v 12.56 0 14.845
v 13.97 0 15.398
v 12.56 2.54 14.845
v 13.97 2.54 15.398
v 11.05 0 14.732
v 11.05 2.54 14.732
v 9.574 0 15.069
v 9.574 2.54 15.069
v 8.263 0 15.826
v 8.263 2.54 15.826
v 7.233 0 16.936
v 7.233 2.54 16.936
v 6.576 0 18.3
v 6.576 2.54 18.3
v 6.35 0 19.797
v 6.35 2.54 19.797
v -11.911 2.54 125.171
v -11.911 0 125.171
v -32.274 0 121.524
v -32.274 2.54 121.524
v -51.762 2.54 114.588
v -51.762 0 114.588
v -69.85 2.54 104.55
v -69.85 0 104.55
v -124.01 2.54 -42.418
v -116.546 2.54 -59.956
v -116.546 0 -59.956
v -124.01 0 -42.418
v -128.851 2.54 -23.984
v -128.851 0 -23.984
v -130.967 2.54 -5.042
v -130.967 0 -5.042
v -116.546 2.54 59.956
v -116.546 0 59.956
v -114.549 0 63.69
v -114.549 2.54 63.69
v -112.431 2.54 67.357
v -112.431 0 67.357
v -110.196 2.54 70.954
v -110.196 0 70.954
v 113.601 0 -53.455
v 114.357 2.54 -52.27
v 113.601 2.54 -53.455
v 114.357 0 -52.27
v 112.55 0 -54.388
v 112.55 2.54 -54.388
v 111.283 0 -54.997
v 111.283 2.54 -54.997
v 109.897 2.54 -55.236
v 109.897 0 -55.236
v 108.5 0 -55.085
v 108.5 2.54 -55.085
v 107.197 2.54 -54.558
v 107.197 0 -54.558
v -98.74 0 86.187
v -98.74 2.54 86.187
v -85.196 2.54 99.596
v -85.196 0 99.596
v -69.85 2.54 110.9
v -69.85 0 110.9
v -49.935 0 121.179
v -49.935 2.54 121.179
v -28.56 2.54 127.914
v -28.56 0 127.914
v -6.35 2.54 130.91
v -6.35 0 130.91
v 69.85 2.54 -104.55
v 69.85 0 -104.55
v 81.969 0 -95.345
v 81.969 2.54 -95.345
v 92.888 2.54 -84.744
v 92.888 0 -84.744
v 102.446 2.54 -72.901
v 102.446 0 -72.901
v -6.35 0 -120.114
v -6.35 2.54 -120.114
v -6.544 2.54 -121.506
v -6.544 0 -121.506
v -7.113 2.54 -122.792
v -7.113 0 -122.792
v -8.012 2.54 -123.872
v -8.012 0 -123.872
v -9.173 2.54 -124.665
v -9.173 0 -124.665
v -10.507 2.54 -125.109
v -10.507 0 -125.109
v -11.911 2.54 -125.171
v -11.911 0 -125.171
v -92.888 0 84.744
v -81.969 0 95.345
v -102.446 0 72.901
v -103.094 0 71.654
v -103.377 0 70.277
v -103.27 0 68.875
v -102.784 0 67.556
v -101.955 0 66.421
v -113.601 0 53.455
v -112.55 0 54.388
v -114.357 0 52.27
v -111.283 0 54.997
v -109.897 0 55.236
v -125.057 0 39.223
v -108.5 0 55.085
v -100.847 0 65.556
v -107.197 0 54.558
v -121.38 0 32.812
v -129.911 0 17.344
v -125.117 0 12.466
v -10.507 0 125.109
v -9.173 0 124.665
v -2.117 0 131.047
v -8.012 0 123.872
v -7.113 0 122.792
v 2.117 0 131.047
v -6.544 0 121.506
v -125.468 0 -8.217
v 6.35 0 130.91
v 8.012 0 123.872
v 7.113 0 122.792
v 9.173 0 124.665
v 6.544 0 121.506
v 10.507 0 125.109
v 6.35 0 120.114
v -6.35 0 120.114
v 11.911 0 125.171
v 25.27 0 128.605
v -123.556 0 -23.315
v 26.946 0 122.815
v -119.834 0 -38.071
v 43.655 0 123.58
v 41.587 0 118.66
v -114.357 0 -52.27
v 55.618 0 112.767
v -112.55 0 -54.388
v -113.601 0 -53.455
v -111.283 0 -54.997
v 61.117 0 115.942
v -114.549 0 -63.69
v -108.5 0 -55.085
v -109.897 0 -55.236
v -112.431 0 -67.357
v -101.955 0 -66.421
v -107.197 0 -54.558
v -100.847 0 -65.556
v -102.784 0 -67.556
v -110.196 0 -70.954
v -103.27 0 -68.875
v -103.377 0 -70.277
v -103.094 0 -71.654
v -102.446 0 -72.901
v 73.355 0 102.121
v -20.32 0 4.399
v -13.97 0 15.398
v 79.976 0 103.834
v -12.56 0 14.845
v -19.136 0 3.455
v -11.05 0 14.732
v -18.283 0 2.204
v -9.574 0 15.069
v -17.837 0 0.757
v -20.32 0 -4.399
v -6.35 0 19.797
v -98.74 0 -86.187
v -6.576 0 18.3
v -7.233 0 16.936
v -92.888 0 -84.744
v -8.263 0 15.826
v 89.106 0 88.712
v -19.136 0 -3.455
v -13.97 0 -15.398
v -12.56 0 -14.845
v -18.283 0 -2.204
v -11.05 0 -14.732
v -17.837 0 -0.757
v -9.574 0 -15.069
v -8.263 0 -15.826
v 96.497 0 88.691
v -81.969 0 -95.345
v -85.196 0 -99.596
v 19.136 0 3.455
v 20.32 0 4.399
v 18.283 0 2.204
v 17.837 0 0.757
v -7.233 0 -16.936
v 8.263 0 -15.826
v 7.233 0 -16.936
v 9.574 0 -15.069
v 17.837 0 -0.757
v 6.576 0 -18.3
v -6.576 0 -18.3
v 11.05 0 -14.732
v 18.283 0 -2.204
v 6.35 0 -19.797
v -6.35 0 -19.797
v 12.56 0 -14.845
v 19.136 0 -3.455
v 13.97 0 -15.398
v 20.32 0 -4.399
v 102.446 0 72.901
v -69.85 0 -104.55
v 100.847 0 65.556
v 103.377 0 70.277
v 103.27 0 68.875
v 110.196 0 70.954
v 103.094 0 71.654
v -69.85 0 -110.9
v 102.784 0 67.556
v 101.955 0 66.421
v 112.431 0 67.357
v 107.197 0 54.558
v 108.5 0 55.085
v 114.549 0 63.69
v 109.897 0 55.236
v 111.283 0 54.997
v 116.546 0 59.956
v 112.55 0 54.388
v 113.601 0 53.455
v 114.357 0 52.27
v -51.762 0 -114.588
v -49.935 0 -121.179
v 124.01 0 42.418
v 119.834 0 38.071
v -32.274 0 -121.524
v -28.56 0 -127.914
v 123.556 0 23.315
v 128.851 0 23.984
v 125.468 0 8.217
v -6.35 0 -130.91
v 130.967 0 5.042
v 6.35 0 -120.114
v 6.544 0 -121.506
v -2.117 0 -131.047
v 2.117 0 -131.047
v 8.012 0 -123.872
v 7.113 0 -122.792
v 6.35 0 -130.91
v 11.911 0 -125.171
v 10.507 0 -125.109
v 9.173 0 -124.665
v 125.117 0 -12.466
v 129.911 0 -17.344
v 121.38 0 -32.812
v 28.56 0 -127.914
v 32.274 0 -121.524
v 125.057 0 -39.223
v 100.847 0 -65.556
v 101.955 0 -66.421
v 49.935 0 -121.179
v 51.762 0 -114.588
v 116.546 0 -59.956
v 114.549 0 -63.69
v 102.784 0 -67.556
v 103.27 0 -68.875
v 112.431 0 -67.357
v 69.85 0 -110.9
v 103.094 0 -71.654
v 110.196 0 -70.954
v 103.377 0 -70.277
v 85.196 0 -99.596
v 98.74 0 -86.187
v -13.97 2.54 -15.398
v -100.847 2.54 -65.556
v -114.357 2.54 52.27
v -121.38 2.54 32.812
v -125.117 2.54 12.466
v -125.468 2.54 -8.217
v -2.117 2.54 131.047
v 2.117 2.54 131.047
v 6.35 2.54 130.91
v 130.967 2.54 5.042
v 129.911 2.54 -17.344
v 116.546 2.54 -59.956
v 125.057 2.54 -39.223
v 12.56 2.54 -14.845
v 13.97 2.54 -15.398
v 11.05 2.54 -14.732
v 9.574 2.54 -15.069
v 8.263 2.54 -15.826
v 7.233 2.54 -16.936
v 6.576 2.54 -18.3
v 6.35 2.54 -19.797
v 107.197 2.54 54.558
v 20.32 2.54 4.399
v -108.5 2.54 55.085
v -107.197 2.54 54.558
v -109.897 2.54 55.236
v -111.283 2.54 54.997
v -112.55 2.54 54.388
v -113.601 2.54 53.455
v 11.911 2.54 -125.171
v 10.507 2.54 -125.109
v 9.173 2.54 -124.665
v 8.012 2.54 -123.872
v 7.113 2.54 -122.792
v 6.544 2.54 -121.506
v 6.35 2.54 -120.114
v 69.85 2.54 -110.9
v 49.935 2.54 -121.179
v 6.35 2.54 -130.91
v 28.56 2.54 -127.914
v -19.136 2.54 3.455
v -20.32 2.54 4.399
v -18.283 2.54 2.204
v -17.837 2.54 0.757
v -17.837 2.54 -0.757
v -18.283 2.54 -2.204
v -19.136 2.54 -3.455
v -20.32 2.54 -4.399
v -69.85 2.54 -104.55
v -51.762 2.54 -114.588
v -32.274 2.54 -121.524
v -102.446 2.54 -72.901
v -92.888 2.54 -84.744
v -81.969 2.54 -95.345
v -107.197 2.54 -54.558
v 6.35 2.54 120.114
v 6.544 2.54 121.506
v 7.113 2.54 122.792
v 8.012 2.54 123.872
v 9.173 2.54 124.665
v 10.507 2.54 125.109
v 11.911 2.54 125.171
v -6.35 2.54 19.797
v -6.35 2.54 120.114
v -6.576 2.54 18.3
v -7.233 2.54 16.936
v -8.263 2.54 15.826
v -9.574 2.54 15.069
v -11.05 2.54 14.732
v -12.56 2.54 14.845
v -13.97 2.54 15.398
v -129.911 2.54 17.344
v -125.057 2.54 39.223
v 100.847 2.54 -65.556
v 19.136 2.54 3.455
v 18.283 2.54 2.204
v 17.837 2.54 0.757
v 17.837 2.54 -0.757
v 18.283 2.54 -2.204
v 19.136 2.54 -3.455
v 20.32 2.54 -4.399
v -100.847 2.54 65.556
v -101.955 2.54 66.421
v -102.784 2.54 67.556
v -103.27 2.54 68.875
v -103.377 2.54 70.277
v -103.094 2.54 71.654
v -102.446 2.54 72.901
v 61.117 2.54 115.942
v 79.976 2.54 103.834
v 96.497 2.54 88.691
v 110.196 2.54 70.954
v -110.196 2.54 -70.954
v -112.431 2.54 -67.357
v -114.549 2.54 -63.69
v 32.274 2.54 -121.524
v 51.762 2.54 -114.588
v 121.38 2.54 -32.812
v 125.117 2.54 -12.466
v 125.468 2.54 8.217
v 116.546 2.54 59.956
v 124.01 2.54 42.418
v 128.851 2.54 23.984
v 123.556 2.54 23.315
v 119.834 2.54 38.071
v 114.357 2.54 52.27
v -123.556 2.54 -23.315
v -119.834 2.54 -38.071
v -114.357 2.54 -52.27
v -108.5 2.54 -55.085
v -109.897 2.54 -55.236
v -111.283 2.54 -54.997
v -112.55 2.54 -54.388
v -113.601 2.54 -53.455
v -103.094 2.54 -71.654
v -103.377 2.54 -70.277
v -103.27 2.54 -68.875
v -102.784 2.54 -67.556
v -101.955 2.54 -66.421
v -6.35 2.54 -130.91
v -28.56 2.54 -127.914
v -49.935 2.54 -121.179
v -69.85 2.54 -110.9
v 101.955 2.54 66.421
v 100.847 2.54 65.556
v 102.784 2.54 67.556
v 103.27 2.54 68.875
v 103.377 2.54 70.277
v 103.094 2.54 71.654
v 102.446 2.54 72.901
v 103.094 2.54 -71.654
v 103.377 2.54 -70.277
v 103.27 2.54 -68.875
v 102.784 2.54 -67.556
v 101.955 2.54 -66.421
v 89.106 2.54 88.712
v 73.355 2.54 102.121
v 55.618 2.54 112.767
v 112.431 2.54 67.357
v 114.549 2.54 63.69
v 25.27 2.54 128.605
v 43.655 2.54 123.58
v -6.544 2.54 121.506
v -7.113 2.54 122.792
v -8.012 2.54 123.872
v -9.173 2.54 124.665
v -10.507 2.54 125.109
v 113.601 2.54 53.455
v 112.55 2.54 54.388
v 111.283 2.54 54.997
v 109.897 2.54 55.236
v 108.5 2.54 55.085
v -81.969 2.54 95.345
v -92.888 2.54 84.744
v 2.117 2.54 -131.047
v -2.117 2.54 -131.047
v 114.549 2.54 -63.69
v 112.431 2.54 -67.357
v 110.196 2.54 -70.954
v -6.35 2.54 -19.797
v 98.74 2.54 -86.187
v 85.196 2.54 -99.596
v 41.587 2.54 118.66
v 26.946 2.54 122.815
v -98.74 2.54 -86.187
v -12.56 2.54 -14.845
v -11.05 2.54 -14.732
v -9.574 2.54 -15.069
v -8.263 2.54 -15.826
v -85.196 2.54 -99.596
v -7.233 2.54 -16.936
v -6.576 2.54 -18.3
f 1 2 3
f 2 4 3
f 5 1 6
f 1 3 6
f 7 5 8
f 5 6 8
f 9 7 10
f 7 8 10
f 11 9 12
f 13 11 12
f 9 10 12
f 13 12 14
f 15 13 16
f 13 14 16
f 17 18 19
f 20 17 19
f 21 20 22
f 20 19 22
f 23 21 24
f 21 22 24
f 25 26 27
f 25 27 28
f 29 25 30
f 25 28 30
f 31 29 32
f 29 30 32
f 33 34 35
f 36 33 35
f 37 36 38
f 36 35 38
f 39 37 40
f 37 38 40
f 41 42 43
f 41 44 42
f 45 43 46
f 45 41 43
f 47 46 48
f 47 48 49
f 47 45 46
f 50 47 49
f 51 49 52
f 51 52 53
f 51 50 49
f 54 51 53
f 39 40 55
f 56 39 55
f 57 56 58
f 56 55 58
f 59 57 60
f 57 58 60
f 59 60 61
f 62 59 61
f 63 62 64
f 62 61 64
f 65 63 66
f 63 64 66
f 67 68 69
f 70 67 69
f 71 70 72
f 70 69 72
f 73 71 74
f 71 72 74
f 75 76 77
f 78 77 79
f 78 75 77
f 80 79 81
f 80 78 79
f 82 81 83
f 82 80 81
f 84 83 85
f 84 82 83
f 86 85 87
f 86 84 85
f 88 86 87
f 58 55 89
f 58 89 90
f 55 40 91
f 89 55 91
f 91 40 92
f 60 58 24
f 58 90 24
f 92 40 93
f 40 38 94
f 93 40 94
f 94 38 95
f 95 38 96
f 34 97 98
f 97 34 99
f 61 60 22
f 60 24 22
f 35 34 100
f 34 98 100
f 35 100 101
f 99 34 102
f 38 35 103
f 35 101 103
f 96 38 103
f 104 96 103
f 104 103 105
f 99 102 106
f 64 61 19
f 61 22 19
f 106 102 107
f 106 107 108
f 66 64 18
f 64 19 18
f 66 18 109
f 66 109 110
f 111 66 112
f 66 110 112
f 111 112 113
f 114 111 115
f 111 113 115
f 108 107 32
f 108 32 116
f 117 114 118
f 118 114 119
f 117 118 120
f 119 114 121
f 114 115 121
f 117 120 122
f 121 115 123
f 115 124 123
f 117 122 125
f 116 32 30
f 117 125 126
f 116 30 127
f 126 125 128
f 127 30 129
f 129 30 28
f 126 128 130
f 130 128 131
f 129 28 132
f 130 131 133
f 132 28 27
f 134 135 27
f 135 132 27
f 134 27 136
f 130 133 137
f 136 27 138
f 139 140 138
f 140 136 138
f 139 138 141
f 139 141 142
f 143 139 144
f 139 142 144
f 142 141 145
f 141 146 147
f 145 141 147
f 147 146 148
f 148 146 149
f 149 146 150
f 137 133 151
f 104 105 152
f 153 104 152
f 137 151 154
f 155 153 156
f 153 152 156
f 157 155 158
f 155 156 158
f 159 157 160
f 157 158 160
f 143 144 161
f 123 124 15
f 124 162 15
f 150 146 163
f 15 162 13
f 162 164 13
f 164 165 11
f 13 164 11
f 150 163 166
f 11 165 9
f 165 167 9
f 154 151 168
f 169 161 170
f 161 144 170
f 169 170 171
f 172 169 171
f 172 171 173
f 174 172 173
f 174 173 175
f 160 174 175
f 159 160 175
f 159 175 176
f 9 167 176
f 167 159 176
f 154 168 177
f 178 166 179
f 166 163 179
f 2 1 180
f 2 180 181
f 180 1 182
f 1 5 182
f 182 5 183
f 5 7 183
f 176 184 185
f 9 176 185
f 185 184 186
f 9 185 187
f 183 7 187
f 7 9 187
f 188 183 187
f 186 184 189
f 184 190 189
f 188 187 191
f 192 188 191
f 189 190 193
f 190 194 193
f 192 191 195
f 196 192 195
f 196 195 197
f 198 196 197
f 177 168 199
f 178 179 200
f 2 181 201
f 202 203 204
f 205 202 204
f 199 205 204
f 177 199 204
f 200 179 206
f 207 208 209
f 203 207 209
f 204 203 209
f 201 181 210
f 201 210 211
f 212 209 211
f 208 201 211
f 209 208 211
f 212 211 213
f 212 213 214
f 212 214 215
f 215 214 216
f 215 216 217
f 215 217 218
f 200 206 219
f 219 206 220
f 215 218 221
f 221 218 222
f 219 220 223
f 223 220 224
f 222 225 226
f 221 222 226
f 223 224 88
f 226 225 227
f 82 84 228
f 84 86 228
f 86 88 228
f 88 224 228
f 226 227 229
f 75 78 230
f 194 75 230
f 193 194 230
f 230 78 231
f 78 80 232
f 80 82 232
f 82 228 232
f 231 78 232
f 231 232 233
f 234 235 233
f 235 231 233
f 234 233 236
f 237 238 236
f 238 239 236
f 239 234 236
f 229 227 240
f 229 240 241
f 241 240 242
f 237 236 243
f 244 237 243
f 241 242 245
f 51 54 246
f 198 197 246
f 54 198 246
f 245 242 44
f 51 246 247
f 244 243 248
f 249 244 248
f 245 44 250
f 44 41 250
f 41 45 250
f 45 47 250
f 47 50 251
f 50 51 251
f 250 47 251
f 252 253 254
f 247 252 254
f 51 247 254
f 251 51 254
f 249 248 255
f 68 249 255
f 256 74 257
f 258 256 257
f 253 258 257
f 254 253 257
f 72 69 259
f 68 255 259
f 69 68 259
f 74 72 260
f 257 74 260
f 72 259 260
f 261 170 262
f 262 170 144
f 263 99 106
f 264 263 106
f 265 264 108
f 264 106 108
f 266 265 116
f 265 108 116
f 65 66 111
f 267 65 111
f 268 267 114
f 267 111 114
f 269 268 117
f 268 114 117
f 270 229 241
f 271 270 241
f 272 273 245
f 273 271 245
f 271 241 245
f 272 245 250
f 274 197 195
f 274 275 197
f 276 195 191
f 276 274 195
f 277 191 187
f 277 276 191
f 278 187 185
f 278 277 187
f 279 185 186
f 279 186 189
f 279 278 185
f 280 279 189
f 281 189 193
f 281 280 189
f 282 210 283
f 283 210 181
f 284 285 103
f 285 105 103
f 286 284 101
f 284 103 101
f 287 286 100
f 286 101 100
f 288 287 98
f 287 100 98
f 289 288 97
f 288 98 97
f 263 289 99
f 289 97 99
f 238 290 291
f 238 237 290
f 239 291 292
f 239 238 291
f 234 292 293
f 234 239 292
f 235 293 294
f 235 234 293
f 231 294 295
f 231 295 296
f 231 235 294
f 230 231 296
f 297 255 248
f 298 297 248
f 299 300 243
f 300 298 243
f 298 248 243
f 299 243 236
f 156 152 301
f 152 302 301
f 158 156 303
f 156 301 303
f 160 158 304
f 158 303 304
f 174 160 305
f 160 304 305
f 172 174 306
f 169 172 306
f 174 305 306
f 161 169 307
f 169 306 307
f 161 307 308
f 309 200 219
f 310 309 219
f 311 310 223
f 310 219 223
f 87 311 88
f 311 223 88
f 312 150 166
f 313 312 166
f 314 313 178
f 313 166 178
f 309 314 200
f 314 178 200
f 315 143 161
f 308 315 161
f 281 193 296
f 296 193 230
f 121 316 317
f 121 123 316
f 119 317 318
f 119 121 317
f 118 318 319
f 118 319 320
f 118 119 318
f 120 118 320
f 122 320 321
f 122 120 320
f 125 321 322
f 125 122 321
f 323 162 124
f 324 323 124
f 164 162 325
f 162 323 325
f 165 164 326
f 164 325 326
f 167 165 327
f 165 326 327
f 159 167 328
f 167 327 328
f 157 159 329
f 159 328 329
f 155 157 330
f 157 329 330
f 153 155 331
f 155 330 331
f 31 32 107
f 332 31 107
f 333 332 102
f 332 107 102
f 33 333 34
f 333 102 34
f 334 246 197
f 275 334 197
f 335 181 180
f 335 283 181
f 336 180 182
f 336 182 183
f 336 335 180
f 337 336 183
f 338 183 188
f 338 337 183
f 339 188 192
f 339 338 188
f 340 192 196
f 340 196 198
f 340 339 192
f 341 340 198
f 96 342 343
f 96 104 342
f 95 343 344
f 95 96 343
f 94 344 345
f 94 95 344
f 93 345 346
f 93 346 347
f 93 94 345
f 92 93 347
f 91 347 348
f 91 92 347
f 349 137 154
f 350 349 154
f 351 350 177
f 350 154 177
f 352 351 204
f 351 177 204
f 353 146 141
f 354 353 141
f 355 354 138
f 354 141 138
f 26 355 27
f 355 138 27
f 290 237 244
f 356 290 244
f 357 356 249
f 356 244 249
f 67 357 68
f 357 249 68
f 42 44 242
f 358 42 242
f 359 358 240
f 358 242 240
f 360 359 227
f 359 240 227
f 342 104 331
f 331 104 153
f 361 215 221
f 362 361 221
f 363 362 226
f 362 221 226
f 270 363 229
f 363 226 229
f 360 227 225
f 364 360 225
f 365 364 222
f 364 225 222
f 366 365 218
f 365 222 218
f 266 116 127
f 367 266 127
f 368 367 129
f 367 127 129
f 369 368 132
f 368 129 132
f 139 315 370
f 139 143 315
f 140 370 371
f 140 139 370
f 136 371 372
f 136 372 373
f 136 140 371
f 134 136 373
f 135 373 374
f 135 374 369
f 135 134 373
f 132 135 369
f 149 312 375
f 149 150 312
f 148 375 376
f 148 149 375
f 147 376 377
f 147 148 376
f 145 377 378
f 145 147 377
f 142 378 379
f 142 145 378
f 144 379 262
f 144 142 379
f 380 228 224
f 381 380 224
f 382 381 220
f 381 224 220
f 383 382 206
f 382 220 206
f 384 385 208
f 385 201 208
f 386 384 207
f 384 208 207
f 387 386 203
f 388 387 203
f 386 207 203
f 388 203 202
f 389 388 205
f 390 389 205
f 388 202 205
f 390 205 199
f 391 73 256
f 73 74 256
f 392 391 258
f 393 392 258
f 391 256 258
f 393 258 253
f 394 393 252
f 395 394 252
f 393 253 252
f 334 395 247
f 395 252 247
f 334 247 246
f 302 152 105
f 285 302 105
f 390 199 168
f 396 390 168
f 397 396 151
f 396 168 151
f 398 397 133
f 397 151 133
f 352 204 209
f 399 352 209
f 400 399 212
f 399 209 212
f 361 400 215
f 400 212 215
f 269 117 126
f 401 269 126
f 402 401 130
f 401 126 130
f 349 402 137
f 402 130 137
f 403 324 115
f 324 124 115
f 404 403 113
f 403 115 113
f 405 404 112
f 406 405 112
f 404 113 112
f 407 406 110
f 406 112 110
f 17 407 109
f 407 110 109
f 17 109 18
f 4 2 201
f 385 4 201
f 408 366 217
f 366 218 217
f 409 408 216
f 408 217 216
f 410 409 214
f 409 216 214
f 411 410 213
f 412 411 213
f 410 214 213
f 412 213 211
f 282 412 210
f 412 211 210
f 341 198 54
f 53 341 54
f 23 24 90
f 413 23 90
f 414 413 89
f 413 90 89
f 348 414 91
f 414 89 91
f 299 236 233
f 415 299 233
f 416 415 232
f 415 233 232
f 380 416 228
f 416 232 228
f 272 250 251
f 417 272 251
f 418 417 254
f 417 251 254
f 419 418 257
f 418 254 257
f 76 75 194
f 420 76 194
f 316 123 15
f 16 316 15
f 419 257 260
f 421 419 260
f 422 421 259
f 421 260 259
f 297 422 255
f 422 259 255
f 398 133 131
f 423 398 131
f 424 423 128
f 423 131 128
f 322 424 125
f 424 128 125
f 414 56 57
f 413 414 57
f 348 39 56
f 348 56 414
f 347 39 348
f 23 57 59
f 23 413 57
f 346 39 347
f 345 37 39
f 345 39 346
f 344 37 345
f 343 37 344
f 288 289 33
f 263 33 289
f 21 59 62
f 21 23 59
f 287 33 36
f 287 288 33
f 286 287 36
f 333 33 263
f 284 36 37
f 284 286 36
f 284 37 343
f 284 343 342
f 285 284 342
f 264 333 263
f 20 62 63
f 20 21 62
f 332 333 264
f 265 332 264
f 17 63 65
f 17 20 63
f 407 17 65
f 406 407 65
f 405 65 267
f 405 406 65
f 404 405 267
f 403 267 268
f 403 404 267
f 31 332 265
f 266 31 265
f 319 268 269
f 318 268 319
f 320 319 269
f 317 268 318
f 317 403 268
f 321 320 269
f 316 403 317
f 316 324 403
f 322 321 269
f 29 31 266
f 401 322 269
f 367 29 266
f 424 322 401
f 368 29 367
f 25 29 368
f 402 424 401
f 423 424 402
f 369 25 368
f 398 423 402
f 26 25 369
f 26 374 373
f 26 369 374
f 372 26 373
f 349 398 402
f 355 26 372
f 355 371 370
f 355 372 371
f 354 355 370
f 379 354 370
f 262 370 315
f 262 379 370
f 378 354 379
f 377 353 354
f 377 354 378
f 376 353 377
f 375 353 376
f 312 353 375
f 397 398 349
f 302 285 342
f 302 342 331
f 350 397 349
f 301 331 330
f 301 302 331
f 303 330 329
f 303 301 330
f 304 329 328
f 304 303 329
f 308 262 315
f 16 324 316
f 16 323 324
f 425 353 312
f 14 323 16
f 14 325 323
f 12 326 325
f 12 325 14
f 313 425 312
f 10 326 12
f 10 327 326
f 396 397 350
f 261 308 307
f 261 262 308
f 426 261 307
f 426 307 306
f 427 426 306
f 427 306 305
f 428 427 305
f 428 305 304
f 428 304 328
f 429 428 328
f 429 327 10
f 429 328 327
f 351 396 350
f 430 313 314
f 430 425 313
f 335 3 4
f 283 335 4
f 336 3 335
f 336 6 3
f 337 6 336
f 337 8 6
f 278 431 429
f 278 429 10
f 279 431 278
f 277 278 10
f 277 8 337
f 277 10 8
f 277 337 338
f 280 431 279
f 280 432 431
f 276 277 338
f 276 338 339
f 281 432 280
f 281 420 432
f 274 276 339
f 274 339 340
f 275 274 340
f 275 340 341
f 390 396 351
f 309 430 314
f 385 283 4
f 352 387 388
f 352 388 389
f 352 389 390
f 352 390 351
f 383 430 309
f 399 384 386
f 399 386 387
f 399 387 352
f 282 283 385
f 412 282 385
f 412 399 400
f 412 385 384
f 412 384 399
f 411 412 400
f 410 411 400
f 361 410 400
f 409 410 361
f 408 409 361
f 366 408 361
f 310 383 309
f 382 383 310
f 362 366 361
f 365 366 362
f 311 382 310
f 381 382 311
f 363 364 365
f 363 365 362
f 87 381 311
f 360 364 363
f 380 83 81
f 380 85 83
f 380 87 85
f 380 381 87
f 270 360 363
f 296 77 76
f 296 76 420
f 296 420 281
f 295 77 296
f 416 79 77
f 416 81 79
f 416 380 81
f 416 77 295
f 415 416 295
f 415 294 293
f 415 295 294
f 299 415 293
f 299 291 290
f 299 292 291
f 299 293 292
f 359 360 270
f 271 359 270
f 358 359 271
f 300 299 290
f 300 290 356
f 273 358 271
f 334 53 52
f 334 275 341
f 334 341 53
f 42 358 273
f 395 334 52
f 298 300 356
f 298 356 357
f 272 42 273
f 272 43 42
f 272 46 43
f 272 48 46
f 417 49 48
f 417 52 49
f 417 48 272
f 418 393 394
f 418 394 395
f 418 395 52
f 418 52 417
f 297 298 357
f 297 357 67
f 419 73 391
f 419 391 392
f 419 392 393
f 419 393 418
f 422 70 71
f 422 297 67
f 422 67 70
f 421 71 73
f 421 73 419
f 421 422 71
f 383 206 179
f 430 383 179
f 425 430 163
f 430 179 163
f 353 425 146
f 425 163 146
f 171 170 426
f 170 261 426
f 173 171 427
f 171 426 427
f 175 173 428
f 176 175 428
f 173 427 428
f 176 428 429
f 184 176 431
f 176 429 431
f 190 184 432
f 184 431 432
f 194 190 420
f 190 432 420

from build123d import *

# Parameters (mm, degrees)
BOSS_EXTRUDE1_DEPTH = 2.54
BOSS_EXTRUDE2_START = -2.54
BOSS_EXTRUDE2_DEPTH = 2.54
CIRPATTERN1_COUNT   = 6
FILLET1_R           = 5.08
FILLET2_R           = 5.08


with BuildPart() as part:
    # Sketch2 → Boss-Extrude1 (new body)
    with BuildSketch(Plane(origin=(0, 0, 0), x_dir=(1, 0, 0), z_dir=(0, 1, 0))):
        with BuildLine():
            Line((110.196456712, 70.954302365), (6.35, 10.998522628))
            Line((6.35, 10.998522628), (6.35, 130.910082102))
            ThreePointArc((6.35, 130.910082102), (0, 131.064), (-6.35, 130.910082102))
            Line((-6.35, 130.910082102), (-6.35, 10.998522628))
            Line((-6.35, 10.998522628), (-110.196456712, 70.954302365))
            ThreePointArc((-110.196456712, 70.954302365), (-113.504753522, 65.532), (-116.546456712, 59.955779737))
            Line((-116.546456712, 59.955779737), (-12.7, 0))
            Line((-12.7, 0), (-116.546456712, -59.955779737))
            ThreePointArc((-116.546456712, -59.955779737), (-113.504753522, -65.532), (-110.196456712, -70.954302365))
            Line((-110.196456712, -70.954302365), (-6.35, -10.998522628))
            Line((-6.35, -10.998522628), (-6.35, -130.910082102))
            ThreePointArc((-6.35, -130.910082102), (0, -131.064), (6.35, -130.910082102))
            Line((6.35, -130.910082102), (6.35, -10.998522628))
            Line((6.35, -10.998522628), (110.196456712, -70.954302365))
            ThreePointArc((110.196456712, -70.954302365), (113.504753522, -65.532), (116.546456712, -59.955779737))
            Line((116.546456712, -59.955779737), (12.7, 0))
            Line((12.7, 0), (116.546456712, 59.955779737))
            ThreePointArc((116.546456712, 59.955779737), (113.504753522, 65.532), (110.196456712, 70.954302365))
        make_face()
    extrude(amount=BOSS_EXTRUDE1_DEPTH)

    # Sketch3 → Boss-Extrude2 (add)
    with BuildSketch(Plane(origin=(0, 2.54, 0), x_dir=(1, 0, 0), z_dir=(0, 1, 0)).offset(BOSS_EXTRUDE2_START)):
        with BuildLine():
            Line((-69.85, 110.899727664), (-69.85, 104.549727664))
            ThreePointArc((-69.85, 104.549727664), (0, 125.736502475), (69.85, 104.549727664))
            Line((69.85, 104.549727664), (69.85, 110.899727664))
            ThreePointArc((69.85, 110.899727664), (0, 131.064), (-69.85, 110.899727664))
        make_face()
    boss_extrude2 = extrude(amount=BOSS_EXTRUDE2_DEPTH)

    # CirPattern1: Boss-Extrude2 ×6 about axis
    cirpattern1_axis = Axis((0, 2.54, 0), (0, -1, 0))
    for i in range(1, CIRPATTERN1_COUNT):
        add(boss_extrude2.rotate(cirpattern1_axis, i * 360 / CIRPATTERN1_COUNT))

    # Fillet1
    fillet1_edges = [part.edges().sort_by_distance(p)[0] for p in [
        (111.927053617, 1.27, -57.288766117),
        (105.577053617, 1.27, -68.287288745),
        (-6.35, 1.27, -125.576054862),
        (6.35, 1.27, -125.576054862),
        (-105.577053617, 1.27, -68.287288745),
        (-111.927053617, 1.27, -57.288766117),
        (-111.927053617, 1.27, 57.288766117),
        (-105.577053617, 1.27, 68.287288745),
        (-6.35, 1.27, 125.576054862),
        (6.35, 1.27, 125.576054862),
        (105.577053617, 1.27, 68.287288745),
        (111.927053617, 1.27, 57.288766117),
    ]]
    fillet(fillet1_edges, radius=FILLET1_R)

    # Fillet2
    fillet2_edges = [part.edges().sort_by_distance(p)[0] for p in [
        (6.35, 1.27, -10.998522628),
        (12.7, 1.27, 0),
        (6.35, 1.27, 10.998522628),
        (-6.35, 1.27, 10.998522628),
        (-12.7, 1.27, 0),
        (-6.35, 1.27, -10.998522628),
    ]]
    fillet(fillet2_edges, radius=FILLET2_R)


solid = part.part
